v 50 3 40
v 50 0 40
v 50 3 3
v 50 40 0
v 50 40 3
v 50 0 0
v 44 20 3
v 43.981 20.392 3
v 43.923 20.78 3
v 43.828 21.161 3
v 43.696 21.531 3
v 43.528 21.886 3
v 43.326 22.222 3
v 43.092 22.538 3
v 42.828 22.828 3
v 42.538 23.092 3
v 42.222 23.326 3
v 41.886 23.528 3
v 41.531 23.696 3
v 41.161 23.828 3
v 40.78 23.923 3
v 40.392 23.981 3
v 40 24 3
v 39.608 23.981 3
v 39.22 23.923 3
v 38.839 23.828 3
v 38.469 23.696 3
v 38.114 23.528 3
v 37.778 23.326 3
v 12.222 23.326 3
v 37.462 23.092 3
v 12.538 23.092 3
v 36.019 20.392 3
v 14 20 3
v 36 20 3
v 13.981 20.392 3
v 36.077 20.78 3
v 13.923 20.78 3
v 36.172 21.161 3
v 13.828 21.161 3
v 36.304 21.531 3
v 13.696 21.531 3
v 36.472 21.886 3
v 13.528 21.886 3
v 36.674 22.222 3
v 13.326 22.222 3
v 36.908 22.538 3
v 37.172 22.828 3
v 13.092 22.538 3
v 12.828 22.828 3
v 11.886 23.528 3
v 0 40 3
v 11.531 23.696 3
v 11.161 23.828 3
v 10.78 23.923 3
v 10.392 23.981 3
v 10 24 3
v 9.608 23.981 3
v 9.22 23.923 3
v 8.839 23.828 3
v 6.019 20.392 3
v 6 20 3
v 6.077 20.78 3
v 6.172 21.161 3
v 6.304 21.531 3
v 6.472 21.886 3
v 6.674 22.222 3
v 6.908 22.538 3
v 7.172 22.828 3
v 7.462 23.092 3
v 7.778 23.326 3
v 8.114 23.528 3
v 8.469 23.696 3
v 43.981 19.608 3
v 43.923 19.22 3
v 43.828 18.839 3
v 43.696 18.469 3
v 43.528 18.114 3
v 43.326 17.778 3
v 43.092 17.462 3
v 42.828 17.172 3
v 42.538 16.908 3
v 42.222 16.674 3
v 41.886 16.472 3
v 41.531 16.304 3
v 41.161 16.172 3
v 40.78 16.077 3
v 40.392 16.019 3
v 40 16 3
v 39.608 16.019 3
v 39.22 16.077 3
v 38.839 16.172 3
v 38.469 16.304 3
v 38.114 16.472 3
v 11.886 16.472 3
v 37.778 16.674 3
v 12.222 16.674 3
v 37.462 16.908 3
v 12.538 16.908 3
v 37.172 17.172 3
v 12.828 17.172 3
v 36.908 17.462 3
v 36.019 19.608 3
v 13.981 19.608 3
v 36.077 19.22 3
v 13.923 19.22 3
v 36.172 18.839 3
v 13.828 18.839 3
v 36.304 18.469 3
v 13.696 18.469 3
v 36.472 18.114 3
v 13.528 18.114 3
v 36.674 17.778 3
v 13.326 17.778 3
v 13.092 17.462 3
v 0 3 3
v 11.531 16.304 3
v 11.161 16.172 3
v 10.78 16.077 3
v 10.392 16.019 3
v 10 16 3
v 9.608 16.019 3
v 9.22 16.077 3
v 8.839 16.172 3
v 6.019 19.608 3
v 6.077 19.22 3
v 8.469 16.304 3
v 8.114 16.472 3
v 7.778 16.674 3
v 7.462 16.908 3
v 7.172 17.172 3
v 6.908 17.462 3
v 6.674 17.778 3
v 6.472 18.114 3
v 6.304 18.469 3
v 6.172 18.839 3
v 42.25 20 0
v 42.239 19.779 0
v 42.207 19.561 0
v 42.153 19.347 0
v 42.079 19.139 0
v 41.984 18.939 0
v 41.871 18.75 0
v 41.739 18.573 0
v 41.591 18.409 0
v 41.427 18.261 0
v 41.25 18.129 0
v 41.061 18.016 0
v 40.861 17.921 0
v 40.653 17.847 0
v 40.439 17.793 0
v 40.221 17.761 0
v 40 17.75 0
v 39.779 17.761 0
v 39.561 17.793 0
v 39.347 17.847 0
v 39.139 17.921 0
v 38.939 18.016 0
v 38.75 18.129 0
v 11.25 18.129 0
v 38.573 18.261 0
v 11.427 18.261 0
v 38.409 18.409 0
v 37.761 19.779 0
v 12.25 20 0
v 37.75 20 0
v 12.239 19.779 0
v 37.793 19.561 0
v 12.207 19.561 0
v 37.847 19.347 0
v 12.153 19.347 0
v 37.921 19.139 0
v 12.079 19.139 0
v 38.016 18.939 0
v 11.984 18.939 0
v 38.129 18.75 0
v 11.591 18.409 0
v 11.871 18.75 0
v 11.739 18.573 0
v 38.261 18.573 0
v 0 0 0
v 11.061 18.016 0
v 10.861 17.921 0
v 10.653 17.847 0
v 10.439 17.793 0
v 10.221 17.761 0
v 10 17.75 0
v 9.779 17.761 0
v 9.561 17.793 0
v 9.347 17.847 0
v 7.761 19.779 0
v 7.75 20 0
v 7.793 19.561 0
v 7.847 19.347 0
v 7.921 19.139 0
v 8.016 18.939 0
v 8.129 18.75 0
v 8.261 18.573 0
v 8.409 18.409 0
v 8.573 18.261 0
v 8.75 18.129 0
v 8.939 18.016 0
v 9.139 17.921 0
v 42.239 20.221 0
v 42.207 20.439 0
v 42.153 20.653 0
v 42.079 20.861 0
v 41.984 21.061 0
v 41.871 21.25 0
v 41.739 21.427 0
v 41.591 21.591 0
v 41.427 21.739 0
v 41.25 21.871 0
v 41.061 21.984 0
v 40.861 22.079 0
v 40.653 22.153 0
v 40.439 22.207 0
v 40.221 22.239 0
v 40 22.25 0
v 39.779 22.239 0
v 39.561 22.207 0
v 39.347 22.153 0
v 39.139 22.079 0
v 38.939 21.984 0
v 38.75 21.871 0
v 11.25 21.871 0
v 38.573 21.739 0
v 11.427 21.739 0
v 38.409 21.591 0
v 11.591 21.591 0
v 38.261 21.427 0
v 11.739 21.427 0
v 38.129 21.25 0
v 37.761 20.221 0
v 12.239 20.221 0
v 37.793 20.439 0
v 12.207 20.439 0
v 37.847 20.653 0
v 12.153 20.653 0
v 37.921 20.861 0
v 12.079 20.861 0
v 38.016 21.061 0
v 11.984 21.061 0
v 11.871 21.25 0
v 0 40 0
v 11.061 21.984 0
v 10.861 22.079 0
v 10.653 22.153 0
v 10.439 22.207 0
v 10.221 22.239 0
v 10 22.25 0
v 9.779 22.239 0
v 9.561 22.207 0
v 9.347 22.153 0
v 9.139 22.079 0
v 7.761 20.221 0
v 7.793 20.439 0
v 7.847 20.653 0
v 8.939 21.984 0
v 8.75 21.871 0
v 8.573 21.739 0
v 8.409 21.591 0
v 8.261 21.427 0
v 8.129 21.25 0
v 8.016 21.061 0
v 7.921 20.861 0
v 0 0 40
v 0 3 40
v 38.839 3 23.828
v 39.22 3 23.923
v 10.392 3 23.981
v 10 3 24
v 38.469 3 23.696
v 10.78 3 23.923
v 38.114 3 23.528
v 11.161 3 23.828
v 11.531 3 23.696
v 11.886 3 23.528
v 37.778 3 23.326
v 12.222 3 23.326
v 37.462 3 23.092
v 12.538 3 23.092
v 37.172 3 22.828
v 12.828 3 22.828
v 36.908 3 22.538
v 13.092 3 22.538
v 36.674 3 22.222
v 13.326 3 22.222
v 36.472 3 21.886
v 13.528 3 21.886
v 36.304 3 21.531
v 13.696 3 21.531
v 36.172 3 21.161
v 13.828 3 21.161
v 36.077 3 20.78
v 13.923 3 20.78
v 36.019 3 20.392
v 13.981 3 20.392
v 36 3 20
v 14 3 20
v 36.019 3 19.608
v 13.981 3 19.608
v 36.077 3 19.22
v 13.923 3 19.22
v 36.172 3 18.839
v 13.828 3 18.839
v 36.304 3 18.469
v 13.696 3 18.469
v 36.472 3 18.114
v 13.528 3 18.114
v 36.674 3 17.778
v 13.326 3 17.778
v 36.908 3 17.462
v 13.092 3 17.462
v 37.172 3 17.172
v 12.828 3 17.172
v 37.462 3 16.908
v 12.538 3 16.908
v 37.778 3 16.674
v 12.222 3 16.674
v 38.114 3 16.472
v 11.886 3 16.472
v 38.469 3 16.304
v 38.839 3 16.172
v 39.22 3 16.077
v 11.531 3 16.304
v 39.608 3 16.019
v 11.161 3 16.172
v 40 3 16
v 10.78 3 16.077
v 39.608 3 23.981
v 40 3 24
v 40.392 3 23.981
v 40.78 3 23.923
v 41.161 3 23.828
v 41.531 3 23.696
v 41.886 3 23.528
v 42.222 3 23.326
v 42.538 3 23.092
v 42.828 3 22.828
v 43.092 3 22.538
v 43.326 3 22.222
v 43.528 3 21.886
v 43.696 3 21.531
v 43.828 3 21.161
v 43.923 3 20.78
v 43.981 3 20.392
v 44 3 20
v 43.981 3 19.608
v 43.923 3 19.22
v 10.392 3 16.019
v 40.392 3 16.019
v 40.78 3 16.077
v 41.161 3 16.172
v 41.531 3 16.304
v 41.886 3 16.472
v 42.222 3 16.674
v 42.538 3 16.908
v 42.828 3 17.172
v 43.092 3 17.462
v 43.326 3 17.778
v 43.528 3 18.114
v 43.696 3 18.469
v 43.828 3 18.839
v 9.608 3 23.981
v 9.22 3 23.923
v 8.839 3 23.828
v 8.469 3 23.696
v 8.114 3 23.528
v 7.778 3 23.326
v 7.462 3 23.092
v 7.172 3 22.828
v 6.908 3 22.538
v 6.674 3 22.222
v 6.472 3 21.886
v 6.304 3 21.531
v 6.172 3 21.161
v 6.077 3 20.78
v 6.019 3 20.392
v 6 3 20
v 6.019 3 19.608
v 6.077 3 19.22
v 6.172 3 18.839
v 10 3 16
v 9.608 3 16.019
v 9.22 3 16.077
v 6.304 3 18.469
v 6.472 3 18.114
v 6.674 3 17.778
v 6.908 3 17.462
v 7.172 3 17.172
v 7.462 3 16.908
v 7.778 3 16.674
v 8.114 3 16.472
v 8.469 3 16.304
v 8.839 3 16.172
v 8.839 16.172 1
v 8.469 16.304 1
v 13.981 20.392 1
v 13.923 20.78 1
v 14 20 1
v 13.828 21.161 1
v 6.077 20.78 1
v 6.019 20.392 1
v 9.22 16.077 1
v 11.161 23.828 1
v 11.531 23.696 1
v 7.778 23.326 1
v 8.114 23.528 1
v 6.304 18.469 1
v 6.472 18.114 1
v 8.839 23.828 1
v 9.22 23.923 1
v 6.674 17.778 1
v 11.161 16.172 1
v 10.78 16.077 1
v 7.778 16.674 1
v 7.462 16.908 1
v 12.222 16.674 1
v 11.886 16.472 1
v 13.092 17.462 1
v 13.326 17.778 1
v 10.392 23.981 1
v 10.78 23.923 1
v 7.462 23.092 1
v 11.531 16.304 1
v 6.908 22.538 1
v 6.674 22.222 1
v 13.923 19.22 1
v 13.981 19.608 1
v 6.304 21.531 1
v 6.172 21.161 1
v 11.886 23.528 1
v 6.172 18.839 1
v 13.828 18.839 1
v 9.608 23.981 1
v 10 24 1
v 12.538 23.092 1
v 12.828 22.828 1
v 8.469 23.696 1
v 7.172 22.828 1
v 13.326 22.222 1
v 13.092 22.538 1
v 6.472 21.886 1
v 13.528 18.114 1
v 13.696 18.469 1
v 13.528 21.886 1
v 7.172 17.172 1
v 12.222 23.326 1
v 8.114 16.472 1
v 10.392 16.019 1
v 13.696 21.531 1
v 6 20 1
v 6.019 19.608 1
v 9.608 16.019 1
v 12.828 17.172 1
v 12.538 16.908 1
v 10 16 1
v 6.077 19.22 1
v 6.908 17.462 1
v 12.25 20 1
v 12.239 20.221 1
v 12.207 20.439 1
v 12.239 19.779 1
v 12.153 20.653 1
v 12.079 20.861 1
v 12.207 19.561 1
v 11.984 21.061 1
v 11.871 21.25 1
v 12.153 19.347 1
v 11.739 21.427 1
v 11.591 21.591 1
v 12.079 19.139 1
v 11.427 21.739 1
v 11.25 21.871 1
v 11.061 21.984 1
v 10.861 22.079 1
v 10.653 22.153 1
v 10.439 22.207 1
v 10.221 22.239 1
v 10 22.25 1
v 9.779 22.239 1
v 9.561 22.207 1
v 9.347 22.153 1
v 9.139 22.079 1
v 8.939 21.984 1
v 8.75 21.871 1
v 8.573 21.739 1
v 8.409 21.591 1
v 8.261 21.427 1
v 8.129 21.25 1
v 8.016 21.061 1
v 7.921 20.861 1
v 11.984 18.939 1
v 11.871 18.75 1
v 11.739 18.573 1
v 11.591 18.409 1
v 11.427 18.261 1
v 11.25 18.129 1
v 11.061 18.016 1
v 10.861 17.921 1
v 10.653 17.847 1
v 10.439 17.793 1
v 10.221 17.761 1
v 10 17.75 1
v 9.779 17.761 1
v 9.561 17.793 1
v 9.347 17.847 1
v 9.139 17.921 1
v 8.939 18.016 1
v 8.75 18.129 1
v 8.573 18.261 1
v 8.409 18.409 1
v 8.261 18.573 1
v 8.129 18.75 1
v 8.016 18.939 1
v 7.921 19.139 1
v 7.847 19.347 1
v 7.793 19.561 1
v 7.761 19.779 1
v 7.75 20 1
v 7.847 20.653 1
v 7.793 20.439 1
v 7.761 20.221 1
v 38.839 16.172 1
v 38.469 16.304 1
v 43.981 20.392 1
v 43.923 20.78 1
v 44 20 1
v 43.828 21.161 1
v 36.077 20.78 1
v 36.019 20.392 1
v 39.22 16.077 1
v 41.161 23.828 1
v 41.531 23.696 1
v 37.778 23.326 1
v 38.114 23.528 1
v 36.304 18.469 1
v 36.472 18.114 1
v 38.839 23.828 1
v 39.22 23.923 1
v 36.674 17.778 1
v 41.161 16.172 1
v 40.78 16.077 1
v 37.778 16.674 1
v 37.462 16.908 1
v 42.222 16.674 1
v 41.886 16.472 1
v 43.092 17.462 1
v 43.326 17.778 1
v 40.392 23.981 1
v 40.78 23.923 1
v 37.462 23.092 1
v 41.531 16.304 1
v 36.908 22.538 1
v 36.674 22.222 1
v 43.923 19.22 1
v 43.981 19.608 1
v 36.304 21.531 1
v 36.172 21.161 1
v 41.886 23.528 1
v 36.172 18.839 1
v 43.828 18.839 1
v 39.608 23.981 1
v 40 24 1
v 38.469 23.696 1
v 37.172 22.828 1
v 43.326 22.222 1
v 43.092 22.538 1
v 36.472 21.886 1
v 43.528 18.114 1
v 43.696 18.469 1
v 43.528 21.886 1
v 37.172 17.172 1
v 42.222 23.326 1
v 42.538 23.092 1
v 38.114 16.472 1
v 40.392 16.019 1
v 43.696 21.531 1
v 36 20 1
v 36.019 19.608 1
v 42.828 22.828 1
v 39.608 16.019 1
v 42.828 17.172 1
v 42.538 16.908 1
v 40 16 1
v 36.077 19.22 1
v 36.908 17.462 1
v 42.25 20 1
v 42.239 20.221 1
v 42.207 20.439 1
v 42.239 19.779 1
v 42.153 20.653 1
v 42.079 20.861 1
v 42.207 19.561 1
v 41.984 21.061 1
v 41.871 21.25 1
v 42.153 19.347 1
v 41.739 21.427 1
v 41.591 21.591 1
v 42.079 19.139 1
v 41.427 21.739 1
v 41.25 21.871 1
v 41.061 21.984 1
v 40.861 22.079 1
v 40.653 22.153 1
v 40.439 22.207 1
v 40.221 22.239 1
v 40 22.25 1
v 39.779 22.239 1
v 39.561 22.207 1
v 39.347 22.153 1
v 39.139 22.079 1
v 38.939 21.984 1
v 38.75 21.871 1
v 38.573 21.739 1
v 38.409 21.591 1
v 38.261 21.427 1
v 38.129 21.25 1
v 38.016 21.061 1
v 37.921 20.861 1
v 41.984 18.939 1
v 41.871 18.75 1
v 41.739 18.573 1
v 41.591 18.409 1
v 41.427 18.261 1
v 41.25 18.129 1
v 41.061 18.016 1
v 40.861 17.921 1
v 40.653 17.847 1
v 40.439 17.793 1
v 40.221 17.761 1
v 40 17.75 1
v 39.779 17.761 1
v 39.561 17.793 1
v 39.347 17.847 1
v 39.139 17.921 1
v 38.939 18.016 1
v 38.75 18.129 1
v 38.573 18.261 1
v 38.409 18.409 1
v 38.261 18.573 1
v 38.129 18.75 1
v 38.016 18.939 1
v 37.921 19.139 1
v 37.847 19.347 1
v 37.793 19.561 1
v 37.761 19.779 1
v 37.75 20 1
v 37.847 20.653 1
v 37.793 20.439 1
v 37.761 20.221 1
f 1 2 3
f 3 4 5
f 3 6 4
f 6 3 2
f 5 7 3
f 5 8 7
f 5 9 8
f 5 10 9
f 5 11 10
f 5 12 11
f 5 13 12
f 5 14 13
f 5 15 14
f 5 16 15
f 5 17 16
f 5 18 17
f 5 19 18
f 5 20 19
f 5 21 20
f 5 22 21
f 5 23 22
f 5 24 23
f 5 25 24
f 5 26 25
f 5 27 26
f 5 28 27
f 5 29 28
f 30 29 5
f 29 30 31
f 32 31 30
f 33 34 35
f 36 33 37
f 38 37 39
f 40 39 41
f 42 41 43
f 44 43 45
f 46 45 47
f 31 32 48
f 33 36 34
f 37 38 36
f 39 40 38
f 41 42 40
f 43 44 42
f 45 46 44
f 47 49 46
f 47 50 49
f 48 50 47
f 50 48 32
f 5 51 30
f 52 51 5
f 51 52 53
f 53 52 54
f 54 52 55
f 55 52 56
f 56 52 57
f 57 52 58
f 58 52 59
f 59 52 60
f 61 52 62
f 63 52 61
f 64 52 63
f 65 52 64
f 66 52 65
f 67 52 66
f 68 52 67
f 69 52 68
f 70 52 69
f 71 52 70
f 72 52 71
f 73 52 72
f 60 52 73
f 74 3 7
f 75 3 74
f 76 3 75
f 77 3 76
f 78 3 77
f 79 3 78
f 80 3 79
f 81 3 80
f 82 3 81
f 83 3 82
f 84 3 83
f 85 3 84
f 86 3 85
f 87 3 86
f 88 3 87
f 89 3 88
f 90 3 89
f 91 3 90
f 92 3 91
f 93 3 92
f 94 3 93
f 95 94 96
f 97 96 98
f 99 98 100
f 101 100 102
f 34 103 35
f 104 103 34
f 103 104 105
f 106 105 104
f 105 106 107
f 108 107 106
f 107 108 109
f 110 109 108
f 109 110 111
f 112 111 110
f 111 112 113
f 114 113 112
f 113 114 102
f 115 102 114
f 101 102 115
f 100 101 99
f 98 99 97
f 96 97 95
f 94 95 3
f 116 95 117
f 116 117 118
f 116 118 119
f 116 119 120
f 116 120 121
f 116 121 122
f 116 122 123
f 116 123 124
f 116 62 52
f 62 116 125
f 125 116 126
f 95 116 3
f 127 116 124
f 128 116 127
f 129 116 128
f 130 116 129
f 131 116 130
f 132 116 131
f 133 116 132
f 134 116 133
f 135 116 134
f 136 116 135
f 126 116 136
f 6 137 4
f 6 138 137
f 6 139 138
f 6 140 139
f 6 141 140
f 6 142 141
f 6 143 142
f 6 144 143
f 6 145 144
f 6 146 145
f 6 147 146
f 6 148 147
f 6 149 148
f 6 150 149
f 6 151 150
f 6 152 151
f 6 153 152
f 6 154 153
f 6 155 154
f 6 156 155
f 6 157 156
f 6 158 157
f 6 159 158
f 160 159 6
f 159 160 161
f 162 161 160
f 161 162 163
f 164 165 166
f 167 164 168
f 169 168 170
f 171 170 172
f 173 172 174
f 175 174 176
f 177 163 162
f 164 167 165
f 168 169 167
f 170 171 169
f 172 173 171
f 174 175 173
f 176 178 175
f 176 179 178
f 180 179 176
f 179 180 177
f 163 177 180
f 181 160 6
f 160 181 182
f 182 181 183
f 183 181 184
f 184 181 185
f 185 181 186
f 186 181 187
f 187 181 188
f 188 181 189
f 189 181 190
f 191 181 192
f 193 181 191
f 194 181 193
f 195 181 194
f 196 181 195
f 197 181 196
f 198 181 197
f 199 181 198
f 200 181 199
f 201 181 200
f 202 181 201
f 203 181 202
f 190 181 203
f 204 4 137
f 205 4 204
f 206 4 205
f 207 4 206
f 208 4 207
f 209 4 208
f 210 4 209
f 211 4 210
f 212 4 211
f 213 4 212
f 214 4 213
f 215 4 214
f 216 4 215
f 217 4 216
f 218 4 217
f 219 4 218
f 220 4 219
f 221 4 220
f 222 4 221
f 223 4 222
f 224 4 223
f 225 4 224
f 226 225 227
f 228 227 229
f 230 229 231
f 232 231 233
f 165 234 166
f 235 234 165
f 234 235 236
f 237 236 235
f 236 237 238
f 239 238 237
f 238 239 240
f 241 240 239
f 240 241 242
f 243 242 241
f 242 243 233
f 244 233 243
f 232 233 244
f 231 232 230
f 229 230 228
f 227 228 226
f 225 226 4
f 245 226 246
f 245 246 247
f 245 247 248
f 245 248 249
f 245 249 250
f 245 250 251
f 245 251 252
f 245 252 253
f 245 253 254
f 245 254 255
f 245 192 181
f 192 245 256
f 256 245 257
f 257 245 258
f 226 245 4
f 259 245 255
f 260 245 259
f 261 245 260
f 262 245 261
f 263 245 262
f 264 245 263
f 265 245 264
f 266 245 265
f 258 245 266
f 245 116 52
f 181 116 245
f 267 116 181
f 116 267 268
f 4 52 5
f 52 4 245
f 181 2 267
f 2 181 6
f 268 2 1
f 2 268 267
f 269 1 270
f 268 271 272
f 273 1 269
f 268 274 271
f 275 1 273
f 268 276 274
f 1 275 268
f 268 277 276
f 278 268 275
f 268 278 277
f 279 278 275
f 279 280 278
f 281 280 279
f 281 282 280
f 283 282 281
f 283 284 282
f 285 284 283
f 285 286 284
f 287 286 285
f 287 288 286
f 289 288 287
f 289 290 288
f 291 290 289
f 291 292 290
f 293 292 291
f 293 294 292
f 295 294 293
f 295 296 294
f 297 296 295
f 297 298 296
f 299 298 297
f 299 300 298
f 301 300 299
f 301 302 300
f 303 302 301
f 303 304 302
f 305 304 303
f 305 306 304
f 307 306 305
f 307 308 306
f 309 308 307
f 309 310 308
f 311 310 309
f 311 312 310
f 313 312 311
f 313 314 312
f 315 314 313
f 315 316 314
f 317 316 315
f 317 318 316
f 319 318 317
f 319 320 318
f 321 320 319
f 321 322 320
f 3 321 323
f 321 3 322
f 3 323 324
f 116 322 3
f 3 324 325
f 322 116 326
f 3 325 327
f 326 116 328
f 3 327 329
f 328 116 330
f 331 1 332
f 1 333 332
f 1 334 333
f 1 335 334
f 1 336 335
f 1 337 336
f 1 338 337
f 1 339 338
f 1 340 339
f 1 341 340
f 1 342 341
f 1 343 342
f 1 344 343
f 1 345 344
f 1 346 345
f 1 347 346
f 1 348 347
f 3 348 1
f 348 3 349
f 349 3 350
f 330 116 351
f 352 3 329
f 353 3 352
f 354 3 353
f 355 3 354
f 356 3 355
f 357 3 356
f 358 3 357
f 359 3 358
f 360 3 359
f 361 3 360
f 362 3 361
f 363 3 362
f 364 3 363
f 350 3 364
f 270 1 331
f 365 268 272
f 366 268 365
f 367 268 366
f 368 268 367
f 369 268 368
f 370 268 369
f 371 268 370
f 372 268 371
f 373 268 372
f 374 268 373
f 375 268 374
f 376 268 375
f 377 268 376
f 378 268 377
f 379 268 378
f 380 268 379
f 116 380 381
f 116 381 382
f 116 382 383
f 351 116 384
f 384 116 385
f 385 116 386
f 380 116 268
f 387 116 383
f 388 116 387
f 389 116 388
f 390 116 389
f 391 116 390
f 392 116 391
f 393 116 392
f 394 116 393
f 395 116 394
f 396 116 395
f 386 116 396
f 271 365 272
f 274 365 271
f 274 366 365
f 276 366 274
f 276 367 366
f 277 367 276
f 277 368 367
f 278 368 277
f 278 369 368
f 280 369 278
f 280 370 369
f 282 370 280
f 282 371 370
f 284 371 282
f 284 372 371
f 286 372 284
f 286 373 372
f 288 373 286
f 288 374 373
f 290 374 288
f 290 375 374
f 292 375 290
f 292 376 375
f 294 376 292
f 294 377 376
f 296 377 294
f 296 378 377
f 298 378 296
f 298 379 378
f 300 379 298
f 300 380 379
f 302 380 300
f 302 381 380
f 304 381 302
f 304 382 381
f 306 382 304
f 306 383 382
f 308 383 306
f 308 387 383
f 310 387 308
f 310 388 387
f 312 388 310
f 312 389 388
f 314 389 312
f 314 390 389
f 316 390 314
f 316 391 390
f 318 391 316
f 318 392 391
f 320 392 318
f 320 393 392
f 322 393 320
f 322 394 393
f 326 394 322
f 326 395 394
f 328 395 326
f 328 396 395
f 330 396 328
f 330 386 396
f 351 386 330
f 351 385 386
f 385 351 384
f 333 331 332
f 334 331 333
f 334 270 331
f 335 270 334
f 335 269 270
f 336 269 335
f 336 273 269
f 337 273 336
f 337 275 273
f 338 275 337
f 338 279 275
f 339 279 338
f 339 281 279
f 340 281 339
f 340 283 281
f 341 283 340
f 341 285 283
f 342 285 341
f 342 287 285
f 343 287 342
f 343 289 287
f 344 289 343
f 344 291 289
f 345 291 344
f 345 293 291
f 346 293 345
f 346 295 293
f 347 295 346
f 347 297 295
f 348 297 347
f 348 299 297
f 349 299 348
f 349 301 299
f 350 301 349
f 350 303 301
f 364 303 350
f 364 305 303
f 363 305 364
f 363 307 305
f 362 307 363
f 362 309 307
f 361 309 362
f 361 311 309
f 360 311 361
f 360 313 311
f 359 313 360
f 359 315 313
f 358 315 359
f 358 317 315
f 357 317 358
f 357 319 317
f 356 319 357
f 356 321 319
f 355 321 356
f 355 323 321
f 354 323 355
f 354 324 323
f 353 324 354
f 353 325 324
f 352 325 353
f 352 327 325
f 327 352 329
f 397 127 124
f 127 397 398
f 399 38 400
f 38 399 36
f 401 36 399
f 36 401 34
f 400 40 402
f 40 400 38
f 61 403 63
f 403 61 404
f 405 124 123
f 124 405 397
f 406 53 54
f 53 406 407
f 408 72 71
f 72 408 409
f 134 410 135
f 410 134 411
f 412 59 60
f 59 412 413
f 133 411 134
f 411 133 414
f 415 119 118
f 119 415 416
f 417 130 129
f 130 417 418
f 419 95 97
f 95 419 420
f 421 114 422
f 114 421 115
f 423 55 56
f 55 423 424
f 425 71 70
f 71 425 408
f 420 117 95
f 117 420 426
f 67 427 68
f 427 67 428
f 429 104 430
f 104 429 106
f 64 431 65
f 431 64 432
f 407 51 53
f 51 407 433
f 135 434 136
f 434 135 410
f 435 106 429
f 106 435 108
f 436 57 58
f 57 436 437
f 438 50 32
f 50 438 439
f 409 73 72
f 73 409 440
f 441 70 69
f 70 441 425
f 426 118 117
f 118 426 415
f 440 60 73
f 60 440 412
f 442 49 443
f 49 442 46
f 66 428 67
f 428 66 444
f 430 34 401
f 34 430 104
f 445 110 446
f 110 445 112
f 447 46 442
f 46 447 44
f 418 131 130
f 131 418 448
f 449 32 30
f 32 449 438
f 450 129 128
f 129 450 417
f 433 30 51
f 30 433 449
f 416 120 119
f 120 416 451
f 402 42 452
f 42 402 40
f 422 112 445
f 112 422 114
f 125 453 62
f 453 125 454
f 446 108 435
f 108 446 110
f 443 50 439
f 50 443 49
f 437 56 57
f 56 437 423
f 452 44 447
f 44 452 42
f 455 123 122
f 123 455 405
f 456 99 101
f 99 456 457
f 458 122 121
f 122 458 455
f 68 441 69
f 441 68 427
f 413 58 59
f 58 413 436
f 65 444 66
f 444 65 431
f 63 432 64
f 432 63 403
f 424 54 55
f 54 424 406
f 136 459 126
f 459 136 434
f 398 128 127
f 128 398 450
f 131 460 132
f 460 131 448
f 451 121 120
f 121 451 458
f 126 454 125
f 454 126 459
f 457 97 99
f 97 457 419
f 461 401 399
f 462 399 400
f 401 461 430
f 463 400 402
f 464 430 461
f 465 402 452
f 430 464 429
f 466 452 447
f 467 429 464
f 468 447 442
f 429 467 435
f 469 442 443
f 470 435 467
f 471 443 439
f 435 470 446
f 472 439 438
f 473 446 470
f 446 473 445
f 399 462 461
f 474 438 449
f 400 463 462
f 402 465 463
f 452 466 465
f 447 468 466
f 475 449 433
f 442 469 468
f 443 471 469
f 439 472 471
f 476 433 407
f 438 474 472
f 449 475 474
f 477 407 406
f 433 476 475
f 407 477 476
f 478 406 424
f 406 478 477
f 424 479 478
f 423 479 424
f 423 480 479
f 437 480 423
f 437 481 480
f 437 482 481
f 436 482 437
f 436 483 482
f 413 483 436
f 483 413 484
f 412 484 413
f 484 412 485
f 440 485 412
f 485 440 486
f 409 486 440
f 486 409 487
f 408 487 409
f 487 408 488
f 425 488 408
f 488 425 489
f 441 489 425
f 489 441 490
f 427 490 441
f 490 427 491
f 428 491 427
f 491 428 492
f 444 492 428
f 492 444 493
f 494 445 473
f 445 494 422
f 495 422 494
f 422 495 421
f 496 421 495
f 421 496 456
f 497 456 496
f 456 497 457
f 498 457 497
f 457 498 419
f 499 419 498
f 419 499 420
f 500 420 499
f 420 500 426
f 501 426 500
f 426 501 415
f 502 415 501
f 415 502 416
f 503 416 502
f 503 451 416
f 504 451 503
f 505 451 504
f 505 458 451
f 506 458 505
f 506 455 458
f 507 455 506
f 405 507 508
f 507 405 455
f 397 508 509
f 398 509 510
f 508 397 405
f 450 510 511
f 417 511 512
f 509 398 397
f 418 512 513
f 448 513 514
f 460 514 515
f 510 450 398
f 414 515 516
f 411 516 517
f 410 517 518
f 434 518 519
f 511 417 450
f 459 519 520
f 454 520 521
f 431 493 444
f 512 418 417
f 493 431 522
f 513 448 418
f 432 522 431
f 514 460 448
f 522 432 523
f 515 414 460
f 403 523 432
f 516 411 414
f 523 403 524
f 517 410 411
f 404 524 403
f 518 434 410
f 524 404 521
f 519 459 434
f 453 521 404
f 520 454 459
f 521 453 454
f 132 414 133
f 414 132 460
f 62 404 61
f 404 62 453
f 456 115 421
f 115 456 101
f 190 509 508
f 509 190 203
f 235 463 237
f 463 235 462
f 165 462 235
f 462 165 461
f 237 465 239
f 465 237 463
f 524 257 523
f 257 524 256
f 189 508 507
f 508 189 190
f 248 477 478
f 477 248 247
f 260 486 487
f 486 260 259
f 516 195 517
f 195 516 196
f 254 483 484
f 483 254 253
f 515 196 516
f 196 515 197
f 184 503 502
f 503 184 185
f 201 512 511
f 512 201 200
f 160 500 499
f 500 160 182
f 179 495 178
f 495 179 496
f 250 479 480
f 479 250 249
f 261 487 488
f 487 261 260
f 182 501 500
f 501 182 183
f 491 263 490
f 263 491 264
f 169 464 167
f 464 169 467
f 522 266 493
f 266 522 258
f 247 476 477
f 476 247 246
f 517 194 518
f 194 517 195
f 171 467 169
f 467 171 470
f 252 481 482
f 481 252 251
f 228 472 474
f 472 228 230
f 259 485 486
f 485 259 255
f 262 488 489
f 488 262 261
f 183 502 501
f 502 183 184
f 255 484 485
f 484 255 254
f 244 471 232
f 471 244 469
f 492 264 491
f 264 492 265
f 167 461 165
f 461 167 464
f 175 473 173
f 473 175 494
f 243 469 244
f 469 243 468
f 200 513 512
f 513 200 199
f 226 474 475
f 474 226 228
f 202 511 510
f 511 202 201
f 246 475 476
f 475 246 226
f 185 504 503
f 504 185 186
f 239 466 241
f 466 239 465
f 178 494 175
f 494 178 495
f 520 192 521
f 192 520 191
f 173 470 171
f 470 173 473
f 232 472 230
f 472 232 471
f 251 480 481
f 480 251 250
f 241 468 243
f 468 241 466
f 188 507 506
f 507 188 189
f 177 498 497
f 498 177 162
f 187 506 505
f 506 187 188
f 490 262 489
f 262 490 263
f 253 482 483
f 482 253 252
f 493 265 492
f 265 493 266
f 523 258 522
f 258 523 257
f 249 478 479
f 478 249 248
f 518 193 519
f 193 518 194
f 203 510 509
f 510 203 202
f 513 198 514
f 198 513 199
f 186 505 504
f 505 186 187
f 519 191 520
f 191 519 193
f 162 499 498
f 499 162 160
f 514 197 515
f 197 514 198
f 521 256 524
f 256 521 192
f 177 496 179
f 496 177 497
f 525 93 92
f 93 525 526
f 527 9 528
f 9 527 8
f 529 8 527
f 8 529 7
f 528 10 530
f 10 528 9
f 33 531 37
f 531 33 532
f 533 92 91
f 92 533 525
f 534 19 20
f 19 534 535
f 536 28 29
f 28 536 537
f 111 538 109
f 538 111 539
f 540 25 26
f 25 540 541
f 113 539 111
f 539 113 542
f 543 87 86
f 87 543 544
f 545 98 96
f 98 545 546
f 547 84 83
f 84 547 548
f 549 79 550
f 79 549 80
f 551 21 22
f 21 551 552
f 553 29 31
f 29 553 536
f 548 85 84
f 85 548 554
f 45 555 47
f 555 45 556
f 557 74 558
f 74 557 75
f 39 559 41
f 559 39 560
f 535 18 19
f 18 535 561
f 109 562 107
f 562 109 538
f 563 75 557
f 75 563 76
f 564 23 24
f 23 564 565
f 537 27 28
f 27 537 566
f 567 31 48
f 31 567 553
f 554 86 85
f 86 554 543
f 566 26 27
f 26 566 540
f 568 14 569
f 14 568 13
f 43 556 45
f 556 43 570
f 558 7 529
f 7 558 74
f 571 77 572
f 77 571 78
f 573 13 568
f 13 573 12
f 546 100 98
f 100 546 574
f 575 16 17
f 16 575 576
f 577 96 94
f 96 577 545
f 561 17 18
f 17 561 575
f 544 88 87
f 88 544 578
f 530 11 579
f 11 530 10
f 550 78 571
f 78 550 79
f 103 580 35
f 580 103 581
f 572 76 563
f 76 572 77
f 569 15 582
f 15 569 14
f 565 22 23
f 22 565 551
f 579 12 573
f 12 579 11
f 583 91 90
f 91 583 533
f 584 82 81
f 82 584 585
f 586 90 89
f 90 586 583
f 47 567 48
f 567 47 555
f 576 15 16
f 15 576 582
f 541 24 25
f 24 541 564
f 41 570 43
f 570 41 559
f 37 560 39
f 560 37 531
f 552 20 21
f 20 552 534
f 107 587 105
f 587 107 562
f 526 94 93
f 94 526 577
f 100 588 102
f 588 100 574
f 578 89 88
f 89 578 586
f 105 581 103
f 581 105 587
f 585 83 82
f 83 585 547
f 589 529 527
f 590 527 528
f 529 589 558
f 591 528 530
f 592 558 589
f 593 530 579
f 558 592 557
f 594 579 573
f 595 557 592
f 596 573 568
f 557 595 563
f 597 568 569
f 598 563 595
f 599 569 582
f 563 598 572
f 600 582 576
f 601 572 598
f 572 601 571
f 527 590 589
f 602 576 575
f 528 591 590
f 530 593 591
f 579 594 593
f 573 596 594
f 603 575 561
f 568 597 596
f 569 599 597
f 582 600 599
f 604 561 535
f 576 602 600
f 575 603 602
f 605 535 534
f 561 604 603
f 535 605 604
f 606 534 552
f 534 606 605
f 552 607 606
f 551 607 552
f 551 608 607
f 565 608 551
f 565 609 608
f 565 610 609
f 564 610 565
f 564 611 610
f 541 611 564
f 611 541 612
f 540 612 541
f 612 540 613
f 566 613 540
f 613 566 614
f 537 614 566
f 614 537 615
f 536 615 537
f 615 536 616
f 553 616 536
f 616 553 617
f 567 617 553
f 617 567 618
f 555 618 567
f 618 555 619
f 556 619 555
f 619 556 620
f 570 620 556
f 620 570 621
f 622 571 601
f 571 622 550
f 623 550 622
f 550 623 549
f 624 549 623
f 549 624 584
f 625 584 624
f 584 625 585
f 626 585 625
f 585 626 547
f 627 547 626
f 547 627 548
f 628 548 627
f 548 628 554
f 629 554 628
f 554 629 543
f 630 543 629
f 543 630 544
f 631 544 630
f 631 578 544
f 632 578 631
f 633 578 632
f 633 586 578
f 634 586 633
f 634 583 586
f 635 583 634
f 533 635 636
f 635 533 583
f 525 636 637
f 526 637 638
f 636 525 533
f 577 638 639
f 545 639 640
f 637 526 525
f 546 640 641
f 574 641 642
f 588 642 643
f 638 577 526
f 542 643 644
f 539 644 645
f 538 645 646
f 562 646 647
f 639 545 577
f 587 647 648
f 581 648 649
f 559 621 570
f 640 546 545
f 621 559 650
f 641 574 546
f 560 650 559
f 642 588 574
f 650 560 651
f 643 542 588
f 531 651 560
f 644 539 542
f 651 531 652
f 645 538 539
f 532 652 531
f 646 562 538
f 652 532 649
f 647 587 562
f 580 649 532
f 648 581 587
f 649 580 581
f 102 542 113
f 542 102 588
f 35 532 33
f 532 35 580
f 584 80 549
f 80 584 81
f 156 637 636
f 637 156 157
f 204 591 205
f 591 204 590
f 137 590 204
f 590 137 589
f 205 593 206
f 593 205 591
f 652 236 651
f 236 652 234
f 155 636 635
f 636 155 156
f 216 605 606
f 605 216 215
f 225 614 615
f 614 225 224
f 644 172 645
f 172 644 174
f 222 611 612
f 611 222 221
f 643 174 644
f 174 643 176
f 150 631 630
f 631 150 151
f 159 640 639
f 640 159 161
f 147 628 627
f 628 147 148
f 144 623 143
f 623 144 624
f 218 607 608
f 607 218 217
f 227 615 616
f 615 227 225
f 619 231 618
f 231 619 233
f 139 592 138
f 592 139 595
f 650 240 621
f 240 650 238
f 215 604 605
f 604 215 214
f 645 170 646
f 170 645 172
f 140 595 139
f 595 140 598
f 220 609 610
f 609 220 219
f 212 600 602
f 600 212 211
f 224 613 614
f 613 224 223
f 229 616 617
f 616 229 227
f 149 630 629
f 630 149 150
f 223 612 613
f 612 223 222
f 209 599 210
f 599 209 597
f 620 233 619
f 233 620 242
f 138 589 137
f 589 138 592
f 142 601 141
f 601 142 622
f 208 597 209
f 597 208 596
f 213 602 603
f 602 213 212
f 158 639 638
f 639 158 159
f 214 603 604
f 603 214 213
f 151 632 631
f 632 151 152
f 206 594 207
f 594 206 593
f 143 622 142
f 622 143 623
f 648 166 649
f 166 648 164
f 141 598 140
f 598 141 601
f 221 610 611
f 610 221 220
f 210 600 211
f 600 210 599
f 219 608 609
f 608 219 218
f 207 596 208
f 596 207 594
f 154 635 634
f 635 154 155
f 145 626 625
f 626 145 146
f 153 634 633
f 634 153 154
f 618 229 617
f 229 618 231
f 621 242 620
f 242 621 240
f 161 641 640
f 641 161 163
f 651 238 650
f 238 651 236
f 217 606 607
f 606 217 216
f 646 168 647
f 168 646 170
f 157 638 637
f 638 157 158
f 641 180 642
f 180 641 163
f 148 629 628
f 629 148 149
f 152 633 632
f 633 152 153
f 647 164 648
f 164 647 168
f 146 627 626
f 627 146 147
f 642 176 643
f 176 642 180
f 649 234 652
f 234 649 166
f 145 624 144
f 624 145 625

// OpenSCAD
module bracket() {
    // horizontal flange
    translate([0, 0, 0])
        cube([50, 40, 3], center=false);
    // vertical flange
    translate([0, 0, 0])
        cube([50, 3, 40], center=false);
}

module holes() {
    // horizontal flange countersinks and through-holes
    for (x = [10, 40]) {
        // countersink Φ8×2mm at top surface
        translate([x, 20, 3 - 2])
            cylinder(h=2, r=4, $fn=64);
        // through-hole Φ4.5mm
        translate([x, 20, 0])
            cylinder(h=3, r=2.25, $fn=64);
    }
    // vertical flange countersinks and through-holes
    for (x = [10, 40]) {
        // countersink Φ8×2mm on outer side
        translate([x, 3, 20])
            rotate([-90, 0, 0])
                cylinder(h=2, r=4, $fn=64);
        // through-hole Φ4.5mm
        translate([x, 3, 20])
            rotate([-90, 0, 0])
                cylinder(h=3, r=2.25, $fn=64);
    }
}

difference() {
    bracket();
    holes();
}
